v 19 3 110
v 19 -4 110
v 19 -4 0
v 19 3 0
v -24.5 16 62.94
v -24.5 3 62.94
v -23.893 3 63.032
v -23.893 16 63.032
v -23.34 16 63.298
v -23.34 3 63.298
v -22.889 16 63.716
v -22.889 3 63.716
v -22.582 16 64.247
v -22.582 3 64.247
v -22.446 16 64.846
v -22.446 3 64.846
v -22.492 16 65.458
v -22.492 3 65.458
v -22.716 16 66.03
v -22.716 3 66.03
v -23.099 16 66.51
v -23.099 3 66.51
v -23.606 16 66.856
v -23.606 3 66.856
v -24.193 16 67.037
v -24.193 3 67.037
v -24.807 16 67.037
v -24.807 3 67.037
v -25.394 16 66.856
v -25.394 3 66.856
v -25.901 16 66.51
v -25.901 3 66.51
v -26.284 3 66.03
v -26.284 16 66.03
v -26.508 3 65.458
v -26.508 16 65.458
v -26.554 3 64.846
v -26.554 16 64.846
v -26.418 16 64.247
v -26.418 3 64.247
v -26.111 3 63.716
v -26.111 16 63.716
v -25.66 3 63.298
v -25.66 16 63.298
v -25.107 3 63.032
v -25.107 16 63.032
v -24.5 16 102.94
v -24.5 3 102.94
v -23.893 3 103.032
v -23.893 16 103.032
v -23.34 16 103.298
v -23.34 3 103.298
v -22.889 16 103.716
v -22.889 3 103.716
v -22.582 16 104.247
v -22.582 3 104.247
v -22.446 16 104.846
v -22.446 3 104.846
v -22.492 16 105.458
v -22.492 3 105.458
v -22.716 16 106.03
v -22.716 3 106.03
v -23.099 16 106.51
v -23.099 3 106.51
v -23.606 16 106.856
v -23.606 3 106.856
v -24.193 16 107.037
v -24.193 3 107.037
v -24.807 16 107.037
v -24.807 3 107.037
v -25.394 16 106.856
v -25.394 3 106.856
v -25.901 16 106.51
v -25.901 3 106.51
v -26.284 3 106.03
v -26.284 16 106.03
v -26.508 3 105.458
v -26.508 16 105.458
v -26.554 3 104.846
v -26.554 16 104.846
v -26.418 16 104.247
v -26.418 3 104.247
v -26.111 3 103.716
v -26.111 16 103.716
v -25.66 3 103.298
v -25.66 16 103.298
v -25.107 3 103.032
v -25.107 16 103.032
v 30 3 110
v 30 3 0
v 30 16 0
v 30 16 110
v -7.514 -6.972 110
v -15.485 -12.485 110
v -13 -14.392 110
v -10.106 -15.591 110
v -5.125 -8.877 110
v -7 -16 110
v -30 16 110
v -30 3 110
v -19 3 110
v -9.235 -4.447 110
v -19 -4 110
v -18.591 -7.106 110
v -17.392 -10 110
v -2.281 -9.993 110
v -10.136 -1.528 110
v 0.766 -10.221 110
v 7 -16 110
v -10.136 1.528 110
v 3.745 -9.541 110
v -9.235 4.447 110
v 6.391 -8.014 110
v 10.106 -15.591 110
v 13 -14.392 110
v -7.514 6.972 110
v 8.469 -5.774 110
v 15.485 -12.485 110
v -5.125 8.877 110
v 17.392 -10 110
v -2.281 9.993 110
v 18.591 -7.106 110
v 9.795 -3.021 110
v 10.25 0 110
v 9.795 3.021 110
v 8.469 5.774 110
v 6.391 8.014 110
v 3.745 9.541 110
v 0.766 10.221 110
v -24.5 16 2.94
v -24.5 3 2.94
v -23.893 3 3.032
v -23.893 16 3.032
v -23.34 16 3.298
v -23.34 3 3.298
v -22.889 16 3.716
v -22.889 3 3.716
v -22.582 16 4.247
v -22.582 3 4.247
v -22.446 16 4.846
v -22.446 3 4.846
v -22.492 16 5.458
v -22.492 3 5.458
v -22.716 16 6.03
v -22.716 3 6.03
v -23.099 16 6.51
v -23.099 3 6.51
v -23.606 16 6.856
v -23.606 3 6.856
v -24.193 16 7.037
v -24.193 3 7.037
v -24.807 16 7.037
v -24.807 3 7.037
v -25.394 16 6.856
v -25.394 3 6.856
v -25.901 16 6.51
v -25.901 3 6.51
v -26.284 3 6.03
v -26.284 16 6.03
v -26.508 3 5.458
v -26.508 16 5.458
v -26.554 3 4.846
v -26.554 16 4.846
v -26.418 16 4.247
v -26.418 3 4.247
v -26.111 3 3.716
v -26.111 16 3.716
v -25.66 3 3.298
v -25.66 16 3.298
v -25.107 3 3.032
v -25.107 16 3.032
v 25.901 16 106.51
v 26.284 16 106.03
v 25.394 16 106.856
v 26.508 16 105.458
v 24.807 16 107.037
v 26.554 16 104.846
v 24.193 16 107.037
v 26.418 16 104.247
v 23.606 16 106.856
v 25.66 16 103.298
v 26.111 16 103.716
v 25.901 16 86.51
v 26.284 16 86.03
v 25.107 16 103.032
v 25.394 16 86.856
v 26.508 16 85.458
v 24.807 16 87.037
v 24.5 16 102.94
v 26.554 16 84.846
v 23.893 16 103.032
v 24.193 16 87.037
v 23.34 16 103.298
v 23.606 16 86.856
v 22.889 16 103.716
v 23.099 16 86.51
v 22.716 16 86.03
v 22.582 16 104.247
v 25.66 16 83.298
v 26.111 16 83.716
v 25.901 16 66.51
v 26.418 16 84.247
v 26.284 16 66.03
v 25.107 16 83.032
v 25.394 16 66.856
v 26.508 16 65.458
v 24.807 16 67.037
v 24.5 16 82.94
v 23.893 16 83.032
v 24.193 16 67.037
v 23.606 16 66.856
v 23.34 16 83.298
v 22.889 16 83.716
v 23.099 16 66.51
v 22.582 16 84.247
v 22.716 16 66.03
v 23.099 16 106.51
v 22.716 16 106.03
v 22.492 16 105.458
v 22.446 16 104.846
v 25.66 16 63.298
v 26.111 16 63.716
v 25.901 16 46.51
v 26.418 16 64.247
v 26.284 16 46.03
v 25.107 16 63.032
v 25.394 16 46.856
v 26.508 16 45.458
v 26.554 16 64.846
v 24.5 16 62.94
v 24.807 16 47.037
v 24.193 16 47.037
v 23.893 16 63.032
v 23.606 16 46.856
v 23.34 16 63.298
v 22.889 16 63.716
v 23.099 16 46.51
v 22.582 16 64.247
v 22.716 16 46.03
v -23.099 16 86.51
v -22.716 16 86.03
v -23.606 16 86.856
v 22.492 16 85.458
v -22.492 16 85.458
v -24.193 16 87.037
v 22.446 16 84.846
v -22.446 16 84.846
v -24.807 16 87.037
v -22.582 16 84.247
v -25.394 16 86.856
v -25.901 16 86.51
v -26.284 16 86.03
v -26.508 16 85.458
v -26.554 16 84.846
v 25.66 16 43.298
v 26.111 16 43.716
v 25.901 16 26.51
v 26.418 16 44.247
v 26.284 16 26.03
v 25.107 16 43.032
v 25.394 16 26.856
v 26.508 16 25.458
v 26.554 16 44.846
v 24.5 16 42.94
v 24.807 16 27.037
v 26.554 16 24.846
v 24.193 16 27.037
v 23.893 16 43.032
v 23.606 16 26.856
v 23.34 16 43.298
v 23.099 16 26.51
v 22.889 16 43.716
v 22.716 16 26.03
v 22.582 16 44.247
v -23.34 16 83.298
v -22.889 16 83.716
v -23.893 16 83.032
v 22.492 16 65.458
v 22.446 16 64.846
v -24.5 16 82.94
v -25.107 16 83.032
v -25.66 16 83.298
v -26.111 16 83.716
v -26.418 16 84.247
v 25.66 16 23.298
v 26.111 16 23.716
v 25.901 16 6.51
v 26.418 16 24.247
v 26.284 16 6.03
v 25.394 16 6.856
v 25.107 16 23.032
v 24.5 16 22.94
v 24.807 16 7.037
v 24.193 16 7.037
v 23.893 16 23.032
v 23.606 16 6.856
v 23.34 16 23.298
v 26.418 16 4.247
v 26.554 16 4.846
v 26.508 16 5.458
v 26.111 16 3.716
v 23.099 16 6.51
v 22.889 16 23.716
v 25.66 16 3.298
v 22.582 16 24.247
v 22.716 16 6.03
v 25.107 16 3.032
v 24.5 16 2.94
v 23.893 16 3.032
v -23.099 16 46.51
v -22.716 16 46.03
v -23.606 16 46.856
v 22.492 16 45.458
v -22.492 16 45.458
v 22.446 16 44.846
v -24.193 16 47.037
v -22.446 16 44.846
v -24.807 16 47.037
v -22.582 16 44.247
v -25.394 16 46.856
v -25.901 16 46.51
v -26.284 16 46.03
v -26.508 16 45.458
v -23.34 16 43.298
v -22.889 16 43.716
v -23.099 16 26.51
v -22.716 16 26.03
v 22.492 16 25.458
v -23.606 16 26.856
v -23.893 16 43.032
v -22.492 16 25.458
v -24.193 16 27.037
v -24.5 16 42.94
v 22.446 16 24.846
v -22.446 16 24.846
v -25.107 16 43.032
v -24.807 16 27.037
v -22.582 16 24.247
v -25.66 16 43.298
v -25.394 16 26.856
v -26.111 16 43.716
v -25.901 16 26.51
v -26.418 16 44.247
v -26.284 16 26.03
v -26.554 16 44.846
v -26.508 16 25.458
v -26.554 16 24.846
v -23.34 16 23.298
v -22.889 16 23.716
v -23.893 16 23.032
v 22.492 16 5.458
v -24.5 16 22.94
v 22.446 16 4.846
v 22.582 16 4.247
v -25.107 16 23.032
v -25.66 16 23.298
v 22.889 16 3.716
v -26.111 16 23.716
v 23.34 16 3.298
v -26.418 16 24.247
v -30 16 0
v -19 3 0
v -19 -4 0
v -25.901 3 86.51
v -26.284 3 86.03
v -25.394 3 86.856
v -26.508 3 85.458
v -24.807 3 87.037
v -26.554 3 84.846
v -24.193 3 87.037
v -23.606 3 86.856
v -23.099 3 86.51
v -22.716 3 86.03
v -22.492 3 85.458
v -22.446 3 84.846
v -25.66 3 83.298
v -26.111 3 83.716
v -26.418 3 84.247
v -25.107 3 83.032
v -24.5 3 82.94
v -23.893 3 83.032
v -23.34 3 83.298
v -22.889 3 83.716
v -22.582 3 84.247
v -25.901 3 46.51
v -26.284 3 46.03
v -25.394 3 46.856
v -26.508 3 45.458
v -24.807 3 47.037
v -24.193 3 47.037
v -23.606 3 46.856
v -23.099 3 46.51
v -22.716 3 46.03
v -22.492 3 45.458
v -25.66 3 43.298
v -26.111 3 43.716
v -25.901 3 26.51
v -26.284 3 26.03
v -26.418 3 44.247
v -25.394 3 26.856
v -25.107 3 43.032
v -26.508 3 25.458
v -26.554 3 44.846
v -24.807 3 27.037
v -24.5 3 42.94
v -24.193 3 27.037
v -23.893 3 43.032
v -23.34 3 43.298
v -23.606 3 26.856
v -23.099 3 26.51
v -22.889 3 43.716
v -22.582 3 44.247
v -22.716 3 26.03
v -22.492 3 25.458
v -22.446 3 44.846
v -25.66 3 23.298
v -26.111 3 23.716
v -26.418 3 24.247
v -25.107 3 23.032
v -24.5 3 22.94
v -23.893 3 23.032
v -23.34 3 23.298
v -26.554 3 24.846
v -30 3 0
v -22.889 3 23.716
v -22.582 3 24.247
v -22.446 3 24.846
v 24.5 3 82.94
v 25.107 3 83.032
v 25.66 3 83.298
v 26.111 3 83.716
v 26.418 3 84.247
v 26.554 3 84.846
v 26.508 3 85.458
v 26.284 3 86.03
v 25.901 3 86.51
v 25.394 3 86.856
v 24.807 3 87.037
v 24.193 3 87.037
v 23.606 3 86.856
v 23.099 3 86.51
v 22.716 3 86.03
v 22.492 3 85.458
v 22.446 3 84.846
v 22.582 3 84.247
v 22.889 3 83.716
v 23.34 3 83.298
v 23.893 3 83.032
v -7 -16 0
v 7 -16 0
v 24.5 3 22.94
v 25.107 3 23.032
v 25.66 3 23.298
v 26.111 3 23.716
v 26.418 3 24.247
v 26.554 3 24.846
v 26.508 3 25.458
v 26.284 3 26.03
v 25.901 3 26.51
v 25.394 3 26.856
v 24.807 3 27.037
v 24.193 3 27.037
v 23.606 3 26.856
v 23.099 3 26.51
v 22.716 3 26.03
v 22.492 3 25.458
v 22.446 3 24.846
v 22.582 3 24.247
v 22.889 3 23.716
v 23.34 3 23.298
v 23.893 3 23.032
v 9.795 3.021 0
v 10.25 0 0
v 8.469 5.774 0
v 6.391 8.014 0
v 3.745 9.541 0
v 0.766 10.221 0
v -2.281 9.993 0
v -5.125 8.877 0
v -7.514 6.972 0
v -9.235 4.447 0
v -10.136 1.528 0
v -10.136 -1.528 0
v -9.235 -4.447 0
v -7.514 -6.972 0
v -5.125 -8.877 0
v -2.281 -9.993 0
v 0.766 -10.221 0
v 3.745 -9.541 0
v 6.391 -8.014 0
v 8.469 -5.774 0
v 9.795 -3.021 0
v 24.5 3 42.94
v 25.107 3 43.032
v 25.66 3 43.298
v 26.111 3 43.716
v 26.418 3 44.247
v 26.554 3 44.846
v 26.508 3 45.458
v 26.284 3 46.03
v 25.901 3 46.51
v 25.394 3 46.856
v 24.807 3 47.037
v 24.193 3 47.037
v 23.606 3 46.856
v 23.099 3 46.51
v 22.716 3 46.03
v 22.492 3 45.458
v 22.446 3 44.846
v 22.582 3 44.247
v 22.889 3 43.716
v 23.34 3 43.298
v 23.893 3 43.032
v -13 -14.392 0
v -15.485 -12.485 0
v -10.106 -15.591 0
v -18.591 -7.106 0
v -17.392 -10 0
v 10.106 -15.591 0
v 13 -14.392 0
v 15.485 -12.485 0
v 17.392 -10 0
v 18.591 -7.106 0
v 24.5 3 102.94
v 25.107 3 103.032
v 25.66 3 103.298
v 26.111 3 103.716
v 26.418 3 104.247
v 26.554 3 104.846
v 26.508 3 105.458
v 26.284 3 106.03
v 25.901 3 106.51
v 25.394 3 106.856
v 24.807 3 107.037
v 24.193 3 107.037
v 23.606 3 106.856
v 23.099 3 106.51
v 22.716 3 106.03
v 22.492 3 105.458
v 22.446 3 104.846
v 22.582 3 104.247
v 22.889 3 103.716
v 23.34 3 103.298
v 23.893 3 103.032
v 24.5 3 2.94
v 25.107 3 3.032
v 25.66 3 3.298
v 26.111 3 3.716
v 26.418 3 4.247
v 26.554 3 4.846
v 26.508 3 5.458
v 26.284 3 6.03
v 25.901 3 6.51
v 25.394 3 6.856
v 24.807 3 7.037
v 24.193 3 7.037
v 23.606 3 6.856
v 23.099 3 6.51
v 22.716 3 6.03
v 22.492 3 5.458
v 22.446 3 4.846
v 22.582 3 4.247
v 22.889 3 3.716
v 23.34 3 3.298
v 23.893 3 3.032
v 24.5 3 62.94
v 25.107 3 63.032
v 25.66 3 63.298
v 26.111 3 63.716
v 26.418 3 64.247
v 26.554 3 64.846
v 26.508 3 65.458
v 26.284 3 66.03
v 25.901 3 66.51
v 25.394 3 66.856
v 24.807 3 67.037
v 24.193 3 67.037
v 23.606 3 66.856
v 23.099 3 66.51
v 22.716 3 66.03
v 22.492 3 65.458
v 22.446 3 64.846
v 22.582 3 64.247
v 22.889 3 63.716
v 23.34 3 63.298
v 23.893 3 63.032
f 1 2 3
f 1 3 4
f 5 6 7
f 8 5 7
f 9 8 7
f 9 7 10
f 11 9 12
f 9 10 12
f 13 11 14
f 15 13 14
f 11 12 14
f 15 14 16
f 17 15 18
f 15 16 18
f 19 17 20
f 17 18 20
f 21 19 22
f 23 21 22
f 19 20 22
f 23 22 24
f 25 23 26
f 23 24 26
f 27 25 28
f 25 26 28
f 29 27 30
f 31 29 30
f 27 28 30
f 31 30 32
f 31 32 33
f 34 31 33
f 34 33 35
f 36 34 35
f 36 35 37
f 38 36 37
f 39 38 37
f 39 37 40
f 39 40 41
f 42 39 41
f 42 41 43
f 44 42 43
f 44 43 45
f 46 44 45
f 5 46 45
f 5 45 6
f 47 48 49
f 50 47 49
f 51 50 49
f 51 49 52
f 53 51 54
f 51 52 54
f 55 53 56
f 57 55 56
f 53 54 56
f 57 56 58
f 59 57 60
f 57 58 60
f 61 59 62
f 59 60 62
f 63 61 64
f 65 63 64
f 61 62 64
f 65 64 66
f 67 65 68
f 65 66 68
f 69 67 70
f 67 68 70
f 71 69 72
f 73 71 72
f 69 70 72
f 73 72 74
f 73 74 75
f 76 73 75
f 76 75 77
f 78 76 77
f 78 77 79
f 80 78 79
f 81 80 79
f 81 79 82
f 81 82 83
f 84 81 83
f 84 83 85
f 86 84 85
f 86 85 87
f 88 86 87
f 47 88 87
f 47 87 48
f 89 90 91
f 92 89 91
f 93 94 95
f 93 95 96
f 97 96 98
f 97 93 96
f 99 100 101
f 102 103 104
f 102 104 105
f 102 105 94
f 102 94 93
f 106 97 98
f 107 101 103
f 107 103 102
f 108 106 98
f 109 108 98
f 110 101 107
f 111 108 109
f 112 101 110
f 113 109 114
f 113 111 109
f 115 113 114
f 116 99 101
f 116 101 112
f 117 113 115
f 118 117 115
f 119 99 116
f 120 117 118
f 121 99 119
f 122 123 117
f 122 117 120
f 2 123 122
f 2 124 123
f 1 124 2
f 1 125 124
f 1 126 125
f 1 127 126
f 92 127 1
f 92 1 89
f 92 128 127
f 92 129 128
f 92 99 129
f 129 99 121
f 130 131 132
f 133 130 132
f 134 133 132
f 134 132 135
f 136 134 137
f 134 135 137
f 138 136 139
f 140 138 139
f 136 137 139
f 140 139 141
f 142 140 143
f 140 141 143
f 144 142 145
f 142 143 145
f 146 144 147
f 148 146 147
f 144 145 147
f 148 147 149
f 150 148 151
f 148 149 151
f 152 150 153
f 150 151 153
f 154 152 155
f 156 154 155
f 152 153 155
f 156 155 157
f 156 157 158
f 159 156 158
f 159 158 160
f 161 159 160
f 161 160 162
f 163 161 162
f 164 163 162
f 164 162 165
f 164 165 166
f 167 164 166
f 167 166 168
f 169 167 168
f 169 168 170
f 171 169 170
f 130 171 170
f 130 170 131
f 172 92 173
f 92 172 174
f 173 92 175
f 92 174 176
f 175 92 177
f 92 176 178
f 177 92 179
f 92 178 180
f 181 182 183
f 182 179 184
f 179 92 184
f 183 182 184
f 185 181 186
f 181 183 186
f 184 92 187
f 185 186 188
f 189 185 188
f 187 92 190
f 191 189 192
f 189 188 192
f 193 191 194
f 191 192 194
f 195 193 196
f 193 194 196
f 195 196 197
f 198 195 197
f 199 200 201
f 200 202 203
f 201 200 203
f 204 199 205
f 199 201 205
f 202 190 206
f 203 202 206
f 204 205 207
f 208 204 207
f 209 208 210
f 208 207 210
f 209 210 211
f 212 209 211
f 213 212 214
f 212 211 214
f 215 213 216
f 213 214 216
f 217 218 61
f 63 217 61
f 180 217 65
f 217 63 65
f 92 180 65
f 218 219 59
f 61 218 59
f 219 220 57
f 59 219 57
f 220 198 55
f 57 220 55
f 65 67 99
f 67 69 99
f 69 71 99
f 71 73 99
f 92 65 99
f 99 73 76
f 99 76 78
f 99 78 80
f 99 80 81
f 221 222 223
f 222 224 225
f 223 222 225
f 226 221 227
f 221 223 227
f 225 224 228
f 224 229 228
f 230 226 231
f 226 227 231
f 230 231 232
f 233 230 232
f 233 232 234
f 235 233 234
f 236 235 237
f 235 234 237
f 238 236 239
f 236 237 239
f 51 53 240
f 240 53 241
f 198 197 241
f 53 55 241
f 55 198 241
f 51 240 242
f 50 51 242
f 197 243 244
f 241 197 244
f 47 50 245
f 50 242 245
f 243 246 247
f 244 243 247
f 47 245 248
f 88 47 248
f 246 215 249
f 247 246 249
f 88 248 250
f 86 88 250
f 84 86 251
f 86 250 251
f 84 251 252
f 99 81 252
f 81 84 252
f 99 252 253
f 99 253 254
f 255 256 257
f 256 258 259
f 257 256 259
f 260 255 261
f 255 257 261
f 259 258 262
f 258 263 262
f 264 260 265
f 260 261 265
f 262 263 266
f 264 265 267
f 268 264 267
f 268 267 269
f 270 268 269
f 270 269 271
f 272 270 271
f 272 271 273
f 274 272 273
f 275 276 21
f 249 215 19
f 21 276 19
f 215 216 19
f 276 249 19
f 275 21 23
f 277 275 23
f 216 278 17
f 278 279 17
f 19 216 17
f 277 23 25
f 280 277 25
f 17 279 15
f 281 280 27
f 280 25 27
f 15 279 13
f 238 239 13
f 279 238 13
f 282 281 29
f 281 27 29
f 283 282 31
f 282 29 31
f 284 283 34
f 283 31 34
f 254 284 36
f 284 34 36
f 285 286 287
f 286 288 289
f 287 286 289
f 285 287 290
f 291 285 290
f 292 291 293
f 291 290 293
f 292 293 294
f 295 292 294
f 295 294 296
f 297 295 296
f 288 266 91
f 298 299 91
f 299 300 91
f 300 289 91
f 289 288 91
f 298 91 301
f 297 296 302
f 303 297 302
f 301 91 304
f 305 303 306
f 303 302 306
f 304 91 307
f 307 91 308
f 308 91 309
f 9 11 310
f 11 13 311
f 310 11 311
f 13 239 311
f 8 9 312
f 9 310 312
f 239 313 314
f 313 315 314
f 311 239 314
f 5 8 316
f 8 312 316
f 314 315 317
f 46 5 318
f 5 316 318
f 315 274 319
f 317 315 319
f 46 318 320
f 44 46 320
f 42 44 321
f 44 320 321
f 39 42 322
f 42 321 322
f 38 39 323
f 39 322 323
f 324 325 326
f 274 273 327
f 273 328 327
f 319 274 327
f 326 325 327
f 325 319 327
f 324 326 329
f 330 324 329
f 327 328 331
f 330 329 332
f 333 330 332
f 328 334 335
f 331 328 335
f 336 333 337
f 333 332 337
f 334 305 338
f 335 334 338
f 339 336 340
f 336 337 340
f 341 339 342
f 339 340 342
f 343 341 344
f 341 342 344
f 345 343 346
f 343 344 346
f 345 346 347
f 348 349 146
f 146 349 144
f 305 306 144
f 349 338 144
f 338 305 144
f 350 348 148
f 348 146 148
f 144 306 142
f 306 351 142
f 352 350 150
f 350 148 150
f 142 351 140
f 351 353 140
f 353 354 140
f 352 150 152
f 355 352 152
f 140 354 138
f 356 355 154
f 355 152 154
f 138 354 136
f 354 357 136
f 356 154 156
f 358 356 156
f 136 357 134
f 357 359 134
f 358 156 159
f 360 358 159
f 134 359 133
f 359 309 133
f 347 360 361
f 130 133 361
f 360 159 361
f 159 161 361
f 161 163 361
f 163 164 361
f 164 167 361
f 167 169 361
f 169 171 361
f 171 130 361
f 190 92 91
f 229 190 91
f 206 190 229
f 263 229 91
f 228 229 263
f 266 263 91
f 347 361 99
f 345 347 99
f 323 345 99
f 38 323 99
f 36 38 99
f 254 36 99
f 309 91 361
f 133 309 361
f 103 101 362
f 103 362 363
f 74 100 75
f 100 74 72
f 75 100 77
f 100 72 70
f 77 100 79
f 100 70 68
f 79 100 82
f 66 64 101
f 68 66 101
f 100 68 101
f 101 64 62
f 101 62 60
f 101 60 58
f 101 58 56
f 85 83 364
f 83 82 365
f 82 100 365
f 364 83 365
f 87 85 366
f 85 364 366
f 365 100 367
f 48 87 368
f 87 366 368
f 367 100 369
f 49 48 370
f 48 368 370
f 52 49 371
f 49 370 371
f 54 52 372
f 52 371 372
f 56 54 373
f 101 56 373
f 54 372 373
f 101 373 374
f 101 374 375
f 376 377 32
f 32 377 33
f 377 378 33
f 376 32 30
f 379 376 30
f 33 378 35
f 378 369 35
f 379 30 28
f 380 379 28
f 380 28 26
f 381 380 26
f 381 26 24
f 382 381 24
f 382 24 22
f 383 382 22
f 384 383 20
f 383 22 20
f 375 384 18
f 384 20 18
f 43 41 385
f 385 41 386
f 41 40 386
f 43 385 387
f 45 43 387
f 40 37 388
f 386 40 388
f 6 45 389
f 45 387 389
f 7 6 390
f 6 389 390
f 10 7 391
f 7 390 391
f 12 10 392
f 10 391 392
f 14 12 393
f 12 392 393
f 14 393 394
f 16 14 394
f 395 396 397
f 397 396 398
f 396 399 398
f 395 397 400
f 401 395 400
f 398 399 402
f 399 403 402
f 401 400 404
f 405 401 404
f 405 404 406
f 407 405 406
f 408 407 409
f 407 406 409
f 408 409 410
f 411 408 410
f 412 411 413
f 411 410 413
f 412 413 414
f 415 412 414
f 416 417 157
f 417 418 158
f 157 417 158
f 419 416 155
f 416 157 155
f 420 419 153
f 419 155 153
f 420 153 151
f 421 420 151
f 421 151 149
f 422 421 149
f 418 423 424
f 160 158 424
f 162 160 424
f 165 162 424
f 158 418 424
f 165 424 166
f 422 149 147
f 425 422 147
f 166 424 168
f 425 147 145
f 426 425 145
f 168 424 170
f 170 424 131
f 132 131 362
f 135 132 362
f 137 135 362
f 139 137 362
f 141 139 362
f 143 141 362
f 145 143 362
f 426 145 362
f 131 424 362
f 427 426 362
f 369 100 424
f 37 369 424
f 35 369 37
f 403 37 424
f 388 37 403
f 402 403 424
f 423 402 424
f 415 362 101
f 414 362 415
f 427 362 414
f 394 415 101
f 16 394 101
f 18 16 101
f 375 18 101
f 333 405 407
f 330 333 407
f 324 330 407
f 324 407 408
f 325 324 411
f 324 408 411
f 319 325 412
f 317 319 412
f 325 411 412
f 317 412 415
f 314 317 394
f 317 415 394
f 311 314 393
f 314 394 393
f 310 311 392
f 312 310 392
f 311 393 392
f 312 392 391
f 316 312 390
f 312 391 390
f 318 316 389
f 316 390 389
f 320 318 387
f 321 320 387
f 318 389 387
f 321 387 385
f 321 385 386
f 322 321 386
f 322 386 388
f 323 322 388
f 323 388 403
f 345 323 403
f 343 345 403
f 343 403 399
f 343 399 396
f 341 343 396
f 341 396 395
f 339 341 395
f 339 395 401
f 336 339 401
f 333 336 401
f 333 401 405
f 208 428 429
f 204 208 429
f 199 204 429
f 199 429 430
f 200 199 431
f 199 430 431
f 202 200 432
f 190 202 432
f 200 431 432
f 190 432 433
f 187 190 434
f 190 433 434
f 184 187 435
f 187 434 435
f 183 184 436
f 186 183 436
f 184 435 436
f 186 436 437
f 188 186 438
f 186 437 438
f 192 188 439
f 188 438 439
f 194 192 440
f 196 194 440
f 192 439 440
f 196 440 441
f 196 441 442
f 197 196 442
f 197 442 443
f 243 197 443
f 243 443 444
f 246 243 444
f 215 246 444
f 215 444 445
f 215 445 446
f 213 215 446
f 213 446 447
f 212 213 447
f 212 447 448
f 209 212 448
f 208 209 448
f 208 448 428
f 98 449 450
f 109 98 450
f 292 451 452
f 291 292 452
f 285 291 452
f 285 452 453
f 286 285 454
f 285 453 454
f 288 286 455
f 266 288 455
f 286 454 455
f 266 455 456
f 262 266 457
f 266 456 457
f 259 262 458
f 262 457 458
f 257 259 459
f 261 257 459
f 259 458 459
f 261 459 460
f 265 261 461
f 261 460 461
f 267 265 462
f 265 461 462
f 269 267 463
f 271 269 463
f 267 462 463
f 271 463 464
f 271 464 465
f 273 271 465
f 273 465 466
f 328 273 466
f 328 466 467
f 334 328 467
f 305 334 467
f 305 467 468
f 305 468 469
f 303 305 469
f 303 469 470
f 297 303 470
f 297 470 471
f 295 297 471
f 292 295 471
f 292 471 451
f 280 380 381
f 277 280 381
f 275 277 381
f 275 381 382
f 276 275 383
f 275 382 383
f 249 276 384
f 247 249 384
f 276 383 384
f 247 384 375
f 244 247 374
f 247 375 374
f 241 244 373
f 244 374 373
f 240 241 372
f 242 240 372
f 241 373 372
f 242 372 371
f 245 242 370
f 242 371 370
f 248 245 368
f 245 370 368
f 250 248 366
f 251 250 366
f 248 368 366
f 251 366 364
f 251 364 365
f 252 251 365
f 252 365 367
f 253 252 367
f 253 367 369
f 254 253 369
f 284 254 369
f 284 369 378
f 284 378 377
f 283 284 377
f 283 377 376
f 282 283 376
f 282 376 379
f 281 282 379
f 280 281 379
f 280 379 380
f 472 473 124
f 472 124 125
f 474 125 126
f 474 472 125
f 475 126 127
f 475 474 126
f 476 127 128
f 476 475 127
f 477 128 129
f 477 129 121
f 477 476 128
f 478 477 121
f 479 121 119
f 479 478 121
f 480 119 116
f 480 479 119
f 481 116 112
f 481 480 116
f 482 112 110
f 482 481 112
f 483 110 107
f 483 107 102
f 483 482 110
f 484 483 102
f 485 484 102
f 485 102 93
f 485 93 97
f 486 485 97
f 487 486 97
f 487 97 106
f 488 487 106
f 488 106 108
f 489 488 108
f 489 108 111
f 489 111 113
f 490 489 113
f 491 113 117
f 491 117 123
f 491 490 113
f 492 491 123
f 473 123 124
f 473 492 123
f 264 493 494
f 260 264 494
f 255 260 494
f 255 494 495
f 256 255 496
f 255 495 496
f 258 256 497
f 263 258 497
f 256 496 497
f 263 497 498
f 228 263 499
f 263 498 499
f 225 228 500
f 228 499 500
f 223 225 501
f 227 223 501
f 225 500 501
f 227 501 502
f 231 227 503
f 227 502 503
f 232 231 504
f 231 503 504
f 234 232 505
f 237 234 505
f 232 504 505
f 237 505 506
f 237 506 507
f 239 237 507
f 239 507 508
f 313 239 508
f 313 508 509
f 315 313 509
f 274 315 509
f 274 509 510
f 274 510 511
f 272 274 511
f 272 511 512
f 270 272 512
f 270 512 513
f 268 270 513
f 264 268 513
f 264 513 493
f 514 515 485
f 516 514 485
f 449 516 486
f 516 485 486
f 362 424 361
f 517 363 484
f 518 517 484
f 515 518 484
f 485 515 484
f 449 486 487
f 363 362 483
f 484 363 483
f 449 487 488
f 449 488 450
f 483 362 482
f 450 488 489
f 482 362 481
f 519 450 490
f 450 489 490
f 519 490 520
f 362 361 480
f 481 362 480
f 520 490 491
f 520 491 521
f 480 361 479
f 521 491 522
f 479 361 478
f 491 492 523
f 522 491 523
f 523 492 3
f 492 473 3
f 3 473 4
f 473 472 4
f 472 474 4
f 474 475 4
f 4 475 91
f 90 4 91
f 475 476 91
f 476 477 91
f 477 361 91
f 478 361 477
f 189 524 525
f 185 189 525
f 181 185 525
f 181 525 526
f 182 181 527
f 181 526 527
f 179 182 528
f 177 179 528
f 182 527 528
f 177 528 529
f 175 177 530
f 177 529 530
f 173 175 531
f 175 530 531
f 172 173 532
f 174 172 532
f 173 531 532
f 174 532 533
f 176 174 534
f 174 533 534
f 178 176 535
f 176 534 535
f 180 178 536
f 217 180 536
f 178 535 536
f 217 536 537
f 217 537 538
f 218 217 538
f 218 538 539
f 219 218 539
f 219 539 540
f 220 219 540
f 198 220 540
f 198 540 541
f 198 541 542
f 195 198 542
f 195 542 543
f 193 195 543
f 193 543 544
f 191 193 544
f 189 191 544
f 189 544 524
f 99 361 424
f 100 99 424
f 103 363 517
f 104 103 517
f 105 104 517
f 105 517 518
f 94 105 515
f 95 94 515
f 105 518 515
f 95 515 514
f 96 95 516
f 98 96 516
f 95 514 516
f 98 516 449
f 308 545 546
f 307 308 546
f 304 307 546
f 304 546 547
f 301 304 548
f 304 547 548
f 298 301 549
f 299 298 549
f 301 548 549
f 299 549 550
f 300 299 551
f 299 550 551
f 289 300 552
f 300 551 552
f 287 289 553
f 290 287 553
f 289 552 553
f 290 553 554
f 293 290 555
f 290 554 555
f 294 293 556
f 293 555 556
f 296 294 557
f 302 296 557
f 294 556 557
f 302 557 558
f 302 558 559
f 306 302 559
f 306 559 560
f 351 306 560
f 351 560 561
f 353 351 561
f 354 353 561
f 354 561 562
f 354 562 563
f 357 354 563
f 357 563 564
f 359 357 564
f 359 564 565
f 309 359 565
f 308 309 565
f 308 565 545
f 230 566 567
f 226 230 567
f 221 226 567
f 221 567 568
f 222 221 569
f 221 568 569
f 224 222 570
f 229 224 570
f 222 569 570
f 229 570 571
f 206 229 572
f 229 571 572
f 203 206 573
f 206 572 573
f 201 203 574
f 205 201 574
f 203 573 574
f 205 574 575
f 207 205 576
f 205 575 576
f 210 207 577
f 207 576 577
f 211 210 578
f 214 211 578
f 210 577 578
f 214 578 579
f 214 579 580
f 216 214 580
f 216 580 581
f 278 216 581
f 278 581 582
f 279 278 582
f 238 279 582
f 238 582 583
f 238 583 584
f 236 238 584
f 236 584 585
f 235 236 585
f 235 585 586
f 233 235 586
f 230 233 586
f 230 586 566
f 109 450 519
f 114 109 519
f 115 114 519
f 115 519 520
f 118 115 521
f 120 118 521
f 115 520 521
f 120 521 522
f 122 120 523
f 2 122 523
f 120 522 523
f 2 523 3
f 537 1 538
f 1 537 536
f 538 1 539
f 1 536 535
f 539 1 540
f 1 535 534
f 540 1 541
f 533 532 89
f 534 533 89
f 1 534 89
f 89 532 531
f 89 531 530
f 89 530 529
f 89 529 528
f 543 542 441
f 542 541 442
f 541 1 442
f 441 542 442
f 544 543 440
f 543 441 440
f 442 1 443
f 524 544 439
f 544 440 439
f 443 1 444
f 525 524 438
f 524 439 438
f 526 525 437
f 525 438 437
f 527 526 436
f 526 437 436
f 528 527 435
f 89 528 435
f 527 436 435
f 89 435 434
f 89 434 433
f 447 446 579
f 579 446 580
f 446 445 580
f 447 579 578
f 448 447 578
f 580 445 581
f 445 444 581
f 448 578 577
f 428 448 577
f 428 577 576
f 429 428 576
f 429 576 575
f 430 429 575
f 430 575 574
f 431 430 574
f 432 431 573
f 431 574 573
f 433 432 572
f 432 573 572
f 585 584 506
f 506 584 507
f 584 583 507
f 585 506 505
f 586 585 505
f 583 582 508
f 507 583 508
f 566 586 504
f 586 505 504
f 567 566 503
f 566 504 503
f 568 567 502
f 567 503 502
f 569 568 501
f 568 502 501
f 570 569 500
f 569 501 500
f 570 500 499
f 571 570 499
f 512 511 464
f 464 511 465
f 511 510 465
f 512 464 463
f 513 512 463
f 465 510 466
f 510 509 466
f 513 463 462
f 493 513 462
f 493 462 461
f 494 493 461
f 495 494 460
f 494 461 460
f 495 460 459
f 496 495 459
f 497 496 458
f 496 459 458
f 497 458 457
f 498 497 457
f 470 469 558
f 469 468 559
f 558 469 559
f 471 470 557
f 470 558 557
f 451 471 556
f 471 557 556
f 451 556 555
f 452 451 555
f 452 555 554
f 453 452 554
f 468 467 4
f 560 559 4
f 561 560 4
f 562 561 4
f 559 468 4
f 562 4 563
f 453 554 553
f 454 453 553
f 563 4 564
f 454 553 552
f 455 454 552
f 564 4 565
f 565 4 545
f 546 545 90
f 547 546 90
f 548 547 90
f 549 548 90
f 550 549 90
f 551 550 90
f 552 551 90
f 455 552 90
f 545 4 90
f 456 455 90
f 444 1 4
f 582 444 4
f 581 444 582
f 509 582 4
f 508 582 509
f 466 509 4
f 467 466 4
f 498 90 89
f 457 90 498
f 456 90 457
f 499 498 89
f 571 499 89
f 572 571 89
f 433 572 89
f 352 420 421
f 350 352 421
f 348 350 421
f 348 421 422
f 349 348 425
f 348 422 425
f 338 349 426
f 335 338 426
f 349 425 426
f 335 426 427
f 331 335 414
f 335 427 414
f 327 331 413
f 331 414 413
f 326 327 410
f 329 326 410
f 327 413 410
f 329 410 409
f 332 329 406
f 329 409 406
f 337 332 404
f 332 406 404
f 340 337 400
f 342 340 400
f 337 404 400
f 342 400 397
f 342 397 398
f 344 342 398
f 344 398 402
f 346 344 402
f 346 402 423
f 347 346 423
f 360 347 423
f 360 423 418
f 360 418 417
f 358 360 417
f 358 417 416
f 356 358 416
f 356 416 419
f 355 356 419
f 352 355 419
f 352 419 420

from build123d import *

# Parameters (mm, degrees)
CROQUIS1_R              = 10.25
SALIENTE_EXTRUIR1_DEPTH = 110
CORTAR_EXTRUIR1_REACH   = 117.59
CROQUIS2_R              = 2.06


with BuildPart() as part:
    # Croquis1 → Saliente-Extruir1 (new body)
    with BuildSketch(Plane.XY):
        with BuildLine():
            Line((30, 16), (-30, 16))
            Line((-30, 16), (-30, 3))
            Line((-30, 3), (-19, 3))
            Line((-19, 3), (-19, -4))
            ThreePointArc((-19, -4), (-15.485281374, -12.485281374), (-7, -16))
            Line((-7, -16), (7, -16))
            ThreePointArc((7, -16), (15.485281374, -12.485281374), (19, -4))
            Line((19, -4), (19, 3))
            Line((19, 3), (30, 3))
            Line((30, 3), (30, 16))
        make_face()
        Circle(CROQUIS1_R, mode=Mode.SUBTRACT)
    extrude(amount=SALIENTE_EXTRUIR1_DEPTH)

    # Croquis2 → Cortar-Extruir1 (cut, up to next)
    with BuildSketch(Plane.XZ.offset(-3), mode=Mode.PRIVATE) as cortar_extruir1_sk1:
        with Locations(Location((-24.5, 105, 0), (0, 0, 270))):
            Circle(CROQUIS2_R)
    cortar_extruir1_tool1 = extrude(cortar_extruir1_sk1.sketch, amount=-CORTAR_EXTRUIR1_REACH, mode=Mode.PRIVATE) & part.part
    # Croquis2 → Cortar-Extruir1 (cut, up to next)
    with BuildSketch(Plane.XZ.offset(-3), mode=Mode.PRIVATE) as cortar_extruir1_sk2:
        with Locations(Location((-24.5, 85, 0), (0, 0, 270))):
            Circle(CROQUIS2_R)
    cortar_extruir1_tool2 = extrude(cortar_extruir1_sk2.sketch, amount=-CORTAR_EXTRUIR1_REACH, mode=Mode.PRIVATE) & part.part
    # Croquis2 → Cortar-Extruir1 (cut, up to next)
    with BuildSketch(Plane.XZ.offset(-3), mode=Mode.PRIVATE) as cortar_extruir1_sk3:
        with Locations(Location((-24.5, 65, 0), (0, 0, 270))):
            Circle(CROQUIS2_R)
    cortar_extruir1_tool3 = extrude(cortar_extruir1_sk3.sketch, amount=-CORTAR_EXTRUIR1_REACH, mode=Mode.PRIVATE) & part.part
    # Croquis2 → Cortar-Extruir1 (cut, up to next)
    with BuildSketch(Plane.XZ.offset(-3), mode=Mode.PRIVATE) as cortar_extruir1_sk4:
        with Locations(Location((-24.5, 45, 0), (0, 0, 270))):
            Circle(CROQUIS2_R)
    cortar_extruir1_tool4 = extrude(cortar_extruir1_sk4.sketch, amount=-CORTAR_EXTRUIR1_REACH, mode=Mode.PRIVATE) & part.part
    # Croquis2 → Cortar-Extruir1 (cut, up to next)
    with BuildSketch(Plane.XZ.offset(-3), mode=Mode.PRIVATE) as cortar_extruir1_sk5:
        with Locations(Location((-24.5, 25, 0), (0, 0, 270))):
            Circle(CROQUIS2_R)
    cortar_extruir1_tool5 = extrude(cortar_extruir1_sk5.sketch, amount=-CORTAR_EXTRUIR1_REACH, mode=Mode.PRIVATE) & part.part
    # Croquis2 → Cortar-Extruir1 (cut, up to next)
    with BuildSketch(Plane.XZ.offset(-3), mode=Mode.PRIVATE) as cortar_extruir1_sk6:
        with Locations(Location((-24.5, 5, 0), (0, 0, 270))):
            Circle(CROQUIS2_R)
    cortar_extruir1_tool6 = extrude(cortar_extruir1_sk6.sketch, amount=-CORTAR_EXTRUIR1_REACH, mode=Mode.PRIVATE) & part.part
    # Croquis2 → Cortar-Extruir1 (cut, up to next)
    with BuildSketch(Plane.XZ.offset(-3), mode=Mode.PRIVATE) as cortar_extruir1_sk7:
        with Locations(Location((24.5, 5, 0), (0, 0, 270))):
            Circle(CROQUIS2_R)
    cortar_extruir1_tool7 = extrude(cortar_extruir1_sk7.sketch, amount=-CORTAR_EXTRUIR1_REACH, mode=Mode.PRIVATE) & part.part
    # Croquis2 → Cortar-Extruir1 (cut, up to next)
    with BuildSketch(Plane.XZ.offset(-3), mode=Mode.PRIVATE) as cortar_extruir1_sk8:
        with Locations(Location((24.5, 25, 0), (0, 0, 270))):
            Circle(CROQUIS2_R)
    cortar_extruir1_tool8 = extrude(cortar_extruir1_sk8.sketch, amount=-CORTAR_EXTRUIR1_REACH, mode=Mode.PRIVATE) & part.part
    # Croquis2 → Cortar-Extruir1 (cut, up to next)
    with BuildSketch(Plane.XZ.offset(-3), mode=Mode.PRIVATE) as cortar_extruir1_sk9:
        with Locations(Location((24.5, 45, 0), (0, 0, 270))):
            Circle(CROQUIS2_R)
    cortar_extruir1_tool9 = extrude(cortar_extruir1_sk9.sketch, amount=-CORTAR_EXTRUIR1_REACH, mode=Mode.PRIVATE) & part.part
    # Croquis2 → Cortar-Extruir1 (cut, up to next)
    with BuildSketch(Plane.XZ.offset(-3), mode=Mode.PRIVATE) as cortar_extruir1_sk10:
        with Locations(Location((24.5, 65, 0), (0, 0, 270))):
            Circle(CROQUIS2_R)
    cortar_extruir1_tool10 = extrude(cortar_extruir1_sk10.sketch, amount=-CORTAR_EXTRUIR1_REACH, mode=Mode.PRIVATE) & part.part
    # Croquis2 → Cortar-Extruir1 (cut, up to next)
    with BuildSketch(Plane.XZ.offset(-3), mode=Mode.PRIVATE) as cortar_extruir1_sk11:
        with Locations(Location((24.5, 85, 0), (0, 0, 270))):
            Circle(CROQUIS2_R)
    cortar_extruir1_tool11 = extrude(cortar_extruir1_sk11.sketch, amount=-CORTAR_EXTRUIR1_REACH, mode=Mode.PRIVATE) & part.part
    # Croquis2 → Cortar-Extruir1 (cut, up to next)
    with BuildSketch(Plane.XZ.offset(-3), mode=Mode.PRIVATE) as cortar_extruir1_sk12:
        with Locations(Location((24.5, 105, 0), (0, 0, 270))):
            Circle(CROQUIS2_R)
    cortar_extruir1_tool12 = extrude(cortar_extruir1_sk12.sketch, amount=-CORTAR_EXTRUIR1_REACH, mode=Mode.PRIVATE) & part.part
    add(cortar_extruir1_tool1.solids().sort_by_distance((-24.5, 3, 105))[0], mode=Mode.SUBTRACT)
    add(cortar_extruir1_tool2.solids().sort_by_distance((-24.5, 3, 85))[0], mode=Mode.SUBTRACT)
    add(cortar_extruir1_tool3.solids().sort_by_distance((-24.5, 3, 65))[0], mode=Mode.SUBTRACT)
    add(cortar_extruir1_tool4.solids().sort_by_distance((-24.5, 3, 45))[0], mode=Mode.SUBTRACT)
    add(cortar_extruir1_tool5.solids().sort_by_distance((-24.5, 3, 25))[0], mode=Mode.SUBTRACT)
    add(cortar_extruir1_tool6.solids().sort_by_distance((-24.5, 3, 5))[0], mode=Mode.SUBTRACT)
    add(cortar_extruir1_tool7.solids().sort_by_distance((24.5, 3, 5))[0], mode=Mode.SUBTRACT)
    add(cortar_extruir1_tool8.solids().sort_by_distance((24.5, 3, 25))[0], mode=Mode.SUBTRACT)
    add(cortar_extruir1_tool9.solids().sort_by_distance((24.5, 3, 45))[0], mode=Mode.SUBTRACT)
    add(cortar_extruir1_tool10.solids().sort_by_distance((24.5, 3, 65))[0], mode=Mode.SUBTRACT)
    add(cortar_extruir1_tool11.solids().sort_by_distance((24.5, 3, 85))[0], mode=Mode.SUBTRACT)
    add(cortar_extruir1_tool12.solids().sort_by_distance((24.5, 3, 105))[0], mode=Mode.SUBTRACT)


solid = part.part
